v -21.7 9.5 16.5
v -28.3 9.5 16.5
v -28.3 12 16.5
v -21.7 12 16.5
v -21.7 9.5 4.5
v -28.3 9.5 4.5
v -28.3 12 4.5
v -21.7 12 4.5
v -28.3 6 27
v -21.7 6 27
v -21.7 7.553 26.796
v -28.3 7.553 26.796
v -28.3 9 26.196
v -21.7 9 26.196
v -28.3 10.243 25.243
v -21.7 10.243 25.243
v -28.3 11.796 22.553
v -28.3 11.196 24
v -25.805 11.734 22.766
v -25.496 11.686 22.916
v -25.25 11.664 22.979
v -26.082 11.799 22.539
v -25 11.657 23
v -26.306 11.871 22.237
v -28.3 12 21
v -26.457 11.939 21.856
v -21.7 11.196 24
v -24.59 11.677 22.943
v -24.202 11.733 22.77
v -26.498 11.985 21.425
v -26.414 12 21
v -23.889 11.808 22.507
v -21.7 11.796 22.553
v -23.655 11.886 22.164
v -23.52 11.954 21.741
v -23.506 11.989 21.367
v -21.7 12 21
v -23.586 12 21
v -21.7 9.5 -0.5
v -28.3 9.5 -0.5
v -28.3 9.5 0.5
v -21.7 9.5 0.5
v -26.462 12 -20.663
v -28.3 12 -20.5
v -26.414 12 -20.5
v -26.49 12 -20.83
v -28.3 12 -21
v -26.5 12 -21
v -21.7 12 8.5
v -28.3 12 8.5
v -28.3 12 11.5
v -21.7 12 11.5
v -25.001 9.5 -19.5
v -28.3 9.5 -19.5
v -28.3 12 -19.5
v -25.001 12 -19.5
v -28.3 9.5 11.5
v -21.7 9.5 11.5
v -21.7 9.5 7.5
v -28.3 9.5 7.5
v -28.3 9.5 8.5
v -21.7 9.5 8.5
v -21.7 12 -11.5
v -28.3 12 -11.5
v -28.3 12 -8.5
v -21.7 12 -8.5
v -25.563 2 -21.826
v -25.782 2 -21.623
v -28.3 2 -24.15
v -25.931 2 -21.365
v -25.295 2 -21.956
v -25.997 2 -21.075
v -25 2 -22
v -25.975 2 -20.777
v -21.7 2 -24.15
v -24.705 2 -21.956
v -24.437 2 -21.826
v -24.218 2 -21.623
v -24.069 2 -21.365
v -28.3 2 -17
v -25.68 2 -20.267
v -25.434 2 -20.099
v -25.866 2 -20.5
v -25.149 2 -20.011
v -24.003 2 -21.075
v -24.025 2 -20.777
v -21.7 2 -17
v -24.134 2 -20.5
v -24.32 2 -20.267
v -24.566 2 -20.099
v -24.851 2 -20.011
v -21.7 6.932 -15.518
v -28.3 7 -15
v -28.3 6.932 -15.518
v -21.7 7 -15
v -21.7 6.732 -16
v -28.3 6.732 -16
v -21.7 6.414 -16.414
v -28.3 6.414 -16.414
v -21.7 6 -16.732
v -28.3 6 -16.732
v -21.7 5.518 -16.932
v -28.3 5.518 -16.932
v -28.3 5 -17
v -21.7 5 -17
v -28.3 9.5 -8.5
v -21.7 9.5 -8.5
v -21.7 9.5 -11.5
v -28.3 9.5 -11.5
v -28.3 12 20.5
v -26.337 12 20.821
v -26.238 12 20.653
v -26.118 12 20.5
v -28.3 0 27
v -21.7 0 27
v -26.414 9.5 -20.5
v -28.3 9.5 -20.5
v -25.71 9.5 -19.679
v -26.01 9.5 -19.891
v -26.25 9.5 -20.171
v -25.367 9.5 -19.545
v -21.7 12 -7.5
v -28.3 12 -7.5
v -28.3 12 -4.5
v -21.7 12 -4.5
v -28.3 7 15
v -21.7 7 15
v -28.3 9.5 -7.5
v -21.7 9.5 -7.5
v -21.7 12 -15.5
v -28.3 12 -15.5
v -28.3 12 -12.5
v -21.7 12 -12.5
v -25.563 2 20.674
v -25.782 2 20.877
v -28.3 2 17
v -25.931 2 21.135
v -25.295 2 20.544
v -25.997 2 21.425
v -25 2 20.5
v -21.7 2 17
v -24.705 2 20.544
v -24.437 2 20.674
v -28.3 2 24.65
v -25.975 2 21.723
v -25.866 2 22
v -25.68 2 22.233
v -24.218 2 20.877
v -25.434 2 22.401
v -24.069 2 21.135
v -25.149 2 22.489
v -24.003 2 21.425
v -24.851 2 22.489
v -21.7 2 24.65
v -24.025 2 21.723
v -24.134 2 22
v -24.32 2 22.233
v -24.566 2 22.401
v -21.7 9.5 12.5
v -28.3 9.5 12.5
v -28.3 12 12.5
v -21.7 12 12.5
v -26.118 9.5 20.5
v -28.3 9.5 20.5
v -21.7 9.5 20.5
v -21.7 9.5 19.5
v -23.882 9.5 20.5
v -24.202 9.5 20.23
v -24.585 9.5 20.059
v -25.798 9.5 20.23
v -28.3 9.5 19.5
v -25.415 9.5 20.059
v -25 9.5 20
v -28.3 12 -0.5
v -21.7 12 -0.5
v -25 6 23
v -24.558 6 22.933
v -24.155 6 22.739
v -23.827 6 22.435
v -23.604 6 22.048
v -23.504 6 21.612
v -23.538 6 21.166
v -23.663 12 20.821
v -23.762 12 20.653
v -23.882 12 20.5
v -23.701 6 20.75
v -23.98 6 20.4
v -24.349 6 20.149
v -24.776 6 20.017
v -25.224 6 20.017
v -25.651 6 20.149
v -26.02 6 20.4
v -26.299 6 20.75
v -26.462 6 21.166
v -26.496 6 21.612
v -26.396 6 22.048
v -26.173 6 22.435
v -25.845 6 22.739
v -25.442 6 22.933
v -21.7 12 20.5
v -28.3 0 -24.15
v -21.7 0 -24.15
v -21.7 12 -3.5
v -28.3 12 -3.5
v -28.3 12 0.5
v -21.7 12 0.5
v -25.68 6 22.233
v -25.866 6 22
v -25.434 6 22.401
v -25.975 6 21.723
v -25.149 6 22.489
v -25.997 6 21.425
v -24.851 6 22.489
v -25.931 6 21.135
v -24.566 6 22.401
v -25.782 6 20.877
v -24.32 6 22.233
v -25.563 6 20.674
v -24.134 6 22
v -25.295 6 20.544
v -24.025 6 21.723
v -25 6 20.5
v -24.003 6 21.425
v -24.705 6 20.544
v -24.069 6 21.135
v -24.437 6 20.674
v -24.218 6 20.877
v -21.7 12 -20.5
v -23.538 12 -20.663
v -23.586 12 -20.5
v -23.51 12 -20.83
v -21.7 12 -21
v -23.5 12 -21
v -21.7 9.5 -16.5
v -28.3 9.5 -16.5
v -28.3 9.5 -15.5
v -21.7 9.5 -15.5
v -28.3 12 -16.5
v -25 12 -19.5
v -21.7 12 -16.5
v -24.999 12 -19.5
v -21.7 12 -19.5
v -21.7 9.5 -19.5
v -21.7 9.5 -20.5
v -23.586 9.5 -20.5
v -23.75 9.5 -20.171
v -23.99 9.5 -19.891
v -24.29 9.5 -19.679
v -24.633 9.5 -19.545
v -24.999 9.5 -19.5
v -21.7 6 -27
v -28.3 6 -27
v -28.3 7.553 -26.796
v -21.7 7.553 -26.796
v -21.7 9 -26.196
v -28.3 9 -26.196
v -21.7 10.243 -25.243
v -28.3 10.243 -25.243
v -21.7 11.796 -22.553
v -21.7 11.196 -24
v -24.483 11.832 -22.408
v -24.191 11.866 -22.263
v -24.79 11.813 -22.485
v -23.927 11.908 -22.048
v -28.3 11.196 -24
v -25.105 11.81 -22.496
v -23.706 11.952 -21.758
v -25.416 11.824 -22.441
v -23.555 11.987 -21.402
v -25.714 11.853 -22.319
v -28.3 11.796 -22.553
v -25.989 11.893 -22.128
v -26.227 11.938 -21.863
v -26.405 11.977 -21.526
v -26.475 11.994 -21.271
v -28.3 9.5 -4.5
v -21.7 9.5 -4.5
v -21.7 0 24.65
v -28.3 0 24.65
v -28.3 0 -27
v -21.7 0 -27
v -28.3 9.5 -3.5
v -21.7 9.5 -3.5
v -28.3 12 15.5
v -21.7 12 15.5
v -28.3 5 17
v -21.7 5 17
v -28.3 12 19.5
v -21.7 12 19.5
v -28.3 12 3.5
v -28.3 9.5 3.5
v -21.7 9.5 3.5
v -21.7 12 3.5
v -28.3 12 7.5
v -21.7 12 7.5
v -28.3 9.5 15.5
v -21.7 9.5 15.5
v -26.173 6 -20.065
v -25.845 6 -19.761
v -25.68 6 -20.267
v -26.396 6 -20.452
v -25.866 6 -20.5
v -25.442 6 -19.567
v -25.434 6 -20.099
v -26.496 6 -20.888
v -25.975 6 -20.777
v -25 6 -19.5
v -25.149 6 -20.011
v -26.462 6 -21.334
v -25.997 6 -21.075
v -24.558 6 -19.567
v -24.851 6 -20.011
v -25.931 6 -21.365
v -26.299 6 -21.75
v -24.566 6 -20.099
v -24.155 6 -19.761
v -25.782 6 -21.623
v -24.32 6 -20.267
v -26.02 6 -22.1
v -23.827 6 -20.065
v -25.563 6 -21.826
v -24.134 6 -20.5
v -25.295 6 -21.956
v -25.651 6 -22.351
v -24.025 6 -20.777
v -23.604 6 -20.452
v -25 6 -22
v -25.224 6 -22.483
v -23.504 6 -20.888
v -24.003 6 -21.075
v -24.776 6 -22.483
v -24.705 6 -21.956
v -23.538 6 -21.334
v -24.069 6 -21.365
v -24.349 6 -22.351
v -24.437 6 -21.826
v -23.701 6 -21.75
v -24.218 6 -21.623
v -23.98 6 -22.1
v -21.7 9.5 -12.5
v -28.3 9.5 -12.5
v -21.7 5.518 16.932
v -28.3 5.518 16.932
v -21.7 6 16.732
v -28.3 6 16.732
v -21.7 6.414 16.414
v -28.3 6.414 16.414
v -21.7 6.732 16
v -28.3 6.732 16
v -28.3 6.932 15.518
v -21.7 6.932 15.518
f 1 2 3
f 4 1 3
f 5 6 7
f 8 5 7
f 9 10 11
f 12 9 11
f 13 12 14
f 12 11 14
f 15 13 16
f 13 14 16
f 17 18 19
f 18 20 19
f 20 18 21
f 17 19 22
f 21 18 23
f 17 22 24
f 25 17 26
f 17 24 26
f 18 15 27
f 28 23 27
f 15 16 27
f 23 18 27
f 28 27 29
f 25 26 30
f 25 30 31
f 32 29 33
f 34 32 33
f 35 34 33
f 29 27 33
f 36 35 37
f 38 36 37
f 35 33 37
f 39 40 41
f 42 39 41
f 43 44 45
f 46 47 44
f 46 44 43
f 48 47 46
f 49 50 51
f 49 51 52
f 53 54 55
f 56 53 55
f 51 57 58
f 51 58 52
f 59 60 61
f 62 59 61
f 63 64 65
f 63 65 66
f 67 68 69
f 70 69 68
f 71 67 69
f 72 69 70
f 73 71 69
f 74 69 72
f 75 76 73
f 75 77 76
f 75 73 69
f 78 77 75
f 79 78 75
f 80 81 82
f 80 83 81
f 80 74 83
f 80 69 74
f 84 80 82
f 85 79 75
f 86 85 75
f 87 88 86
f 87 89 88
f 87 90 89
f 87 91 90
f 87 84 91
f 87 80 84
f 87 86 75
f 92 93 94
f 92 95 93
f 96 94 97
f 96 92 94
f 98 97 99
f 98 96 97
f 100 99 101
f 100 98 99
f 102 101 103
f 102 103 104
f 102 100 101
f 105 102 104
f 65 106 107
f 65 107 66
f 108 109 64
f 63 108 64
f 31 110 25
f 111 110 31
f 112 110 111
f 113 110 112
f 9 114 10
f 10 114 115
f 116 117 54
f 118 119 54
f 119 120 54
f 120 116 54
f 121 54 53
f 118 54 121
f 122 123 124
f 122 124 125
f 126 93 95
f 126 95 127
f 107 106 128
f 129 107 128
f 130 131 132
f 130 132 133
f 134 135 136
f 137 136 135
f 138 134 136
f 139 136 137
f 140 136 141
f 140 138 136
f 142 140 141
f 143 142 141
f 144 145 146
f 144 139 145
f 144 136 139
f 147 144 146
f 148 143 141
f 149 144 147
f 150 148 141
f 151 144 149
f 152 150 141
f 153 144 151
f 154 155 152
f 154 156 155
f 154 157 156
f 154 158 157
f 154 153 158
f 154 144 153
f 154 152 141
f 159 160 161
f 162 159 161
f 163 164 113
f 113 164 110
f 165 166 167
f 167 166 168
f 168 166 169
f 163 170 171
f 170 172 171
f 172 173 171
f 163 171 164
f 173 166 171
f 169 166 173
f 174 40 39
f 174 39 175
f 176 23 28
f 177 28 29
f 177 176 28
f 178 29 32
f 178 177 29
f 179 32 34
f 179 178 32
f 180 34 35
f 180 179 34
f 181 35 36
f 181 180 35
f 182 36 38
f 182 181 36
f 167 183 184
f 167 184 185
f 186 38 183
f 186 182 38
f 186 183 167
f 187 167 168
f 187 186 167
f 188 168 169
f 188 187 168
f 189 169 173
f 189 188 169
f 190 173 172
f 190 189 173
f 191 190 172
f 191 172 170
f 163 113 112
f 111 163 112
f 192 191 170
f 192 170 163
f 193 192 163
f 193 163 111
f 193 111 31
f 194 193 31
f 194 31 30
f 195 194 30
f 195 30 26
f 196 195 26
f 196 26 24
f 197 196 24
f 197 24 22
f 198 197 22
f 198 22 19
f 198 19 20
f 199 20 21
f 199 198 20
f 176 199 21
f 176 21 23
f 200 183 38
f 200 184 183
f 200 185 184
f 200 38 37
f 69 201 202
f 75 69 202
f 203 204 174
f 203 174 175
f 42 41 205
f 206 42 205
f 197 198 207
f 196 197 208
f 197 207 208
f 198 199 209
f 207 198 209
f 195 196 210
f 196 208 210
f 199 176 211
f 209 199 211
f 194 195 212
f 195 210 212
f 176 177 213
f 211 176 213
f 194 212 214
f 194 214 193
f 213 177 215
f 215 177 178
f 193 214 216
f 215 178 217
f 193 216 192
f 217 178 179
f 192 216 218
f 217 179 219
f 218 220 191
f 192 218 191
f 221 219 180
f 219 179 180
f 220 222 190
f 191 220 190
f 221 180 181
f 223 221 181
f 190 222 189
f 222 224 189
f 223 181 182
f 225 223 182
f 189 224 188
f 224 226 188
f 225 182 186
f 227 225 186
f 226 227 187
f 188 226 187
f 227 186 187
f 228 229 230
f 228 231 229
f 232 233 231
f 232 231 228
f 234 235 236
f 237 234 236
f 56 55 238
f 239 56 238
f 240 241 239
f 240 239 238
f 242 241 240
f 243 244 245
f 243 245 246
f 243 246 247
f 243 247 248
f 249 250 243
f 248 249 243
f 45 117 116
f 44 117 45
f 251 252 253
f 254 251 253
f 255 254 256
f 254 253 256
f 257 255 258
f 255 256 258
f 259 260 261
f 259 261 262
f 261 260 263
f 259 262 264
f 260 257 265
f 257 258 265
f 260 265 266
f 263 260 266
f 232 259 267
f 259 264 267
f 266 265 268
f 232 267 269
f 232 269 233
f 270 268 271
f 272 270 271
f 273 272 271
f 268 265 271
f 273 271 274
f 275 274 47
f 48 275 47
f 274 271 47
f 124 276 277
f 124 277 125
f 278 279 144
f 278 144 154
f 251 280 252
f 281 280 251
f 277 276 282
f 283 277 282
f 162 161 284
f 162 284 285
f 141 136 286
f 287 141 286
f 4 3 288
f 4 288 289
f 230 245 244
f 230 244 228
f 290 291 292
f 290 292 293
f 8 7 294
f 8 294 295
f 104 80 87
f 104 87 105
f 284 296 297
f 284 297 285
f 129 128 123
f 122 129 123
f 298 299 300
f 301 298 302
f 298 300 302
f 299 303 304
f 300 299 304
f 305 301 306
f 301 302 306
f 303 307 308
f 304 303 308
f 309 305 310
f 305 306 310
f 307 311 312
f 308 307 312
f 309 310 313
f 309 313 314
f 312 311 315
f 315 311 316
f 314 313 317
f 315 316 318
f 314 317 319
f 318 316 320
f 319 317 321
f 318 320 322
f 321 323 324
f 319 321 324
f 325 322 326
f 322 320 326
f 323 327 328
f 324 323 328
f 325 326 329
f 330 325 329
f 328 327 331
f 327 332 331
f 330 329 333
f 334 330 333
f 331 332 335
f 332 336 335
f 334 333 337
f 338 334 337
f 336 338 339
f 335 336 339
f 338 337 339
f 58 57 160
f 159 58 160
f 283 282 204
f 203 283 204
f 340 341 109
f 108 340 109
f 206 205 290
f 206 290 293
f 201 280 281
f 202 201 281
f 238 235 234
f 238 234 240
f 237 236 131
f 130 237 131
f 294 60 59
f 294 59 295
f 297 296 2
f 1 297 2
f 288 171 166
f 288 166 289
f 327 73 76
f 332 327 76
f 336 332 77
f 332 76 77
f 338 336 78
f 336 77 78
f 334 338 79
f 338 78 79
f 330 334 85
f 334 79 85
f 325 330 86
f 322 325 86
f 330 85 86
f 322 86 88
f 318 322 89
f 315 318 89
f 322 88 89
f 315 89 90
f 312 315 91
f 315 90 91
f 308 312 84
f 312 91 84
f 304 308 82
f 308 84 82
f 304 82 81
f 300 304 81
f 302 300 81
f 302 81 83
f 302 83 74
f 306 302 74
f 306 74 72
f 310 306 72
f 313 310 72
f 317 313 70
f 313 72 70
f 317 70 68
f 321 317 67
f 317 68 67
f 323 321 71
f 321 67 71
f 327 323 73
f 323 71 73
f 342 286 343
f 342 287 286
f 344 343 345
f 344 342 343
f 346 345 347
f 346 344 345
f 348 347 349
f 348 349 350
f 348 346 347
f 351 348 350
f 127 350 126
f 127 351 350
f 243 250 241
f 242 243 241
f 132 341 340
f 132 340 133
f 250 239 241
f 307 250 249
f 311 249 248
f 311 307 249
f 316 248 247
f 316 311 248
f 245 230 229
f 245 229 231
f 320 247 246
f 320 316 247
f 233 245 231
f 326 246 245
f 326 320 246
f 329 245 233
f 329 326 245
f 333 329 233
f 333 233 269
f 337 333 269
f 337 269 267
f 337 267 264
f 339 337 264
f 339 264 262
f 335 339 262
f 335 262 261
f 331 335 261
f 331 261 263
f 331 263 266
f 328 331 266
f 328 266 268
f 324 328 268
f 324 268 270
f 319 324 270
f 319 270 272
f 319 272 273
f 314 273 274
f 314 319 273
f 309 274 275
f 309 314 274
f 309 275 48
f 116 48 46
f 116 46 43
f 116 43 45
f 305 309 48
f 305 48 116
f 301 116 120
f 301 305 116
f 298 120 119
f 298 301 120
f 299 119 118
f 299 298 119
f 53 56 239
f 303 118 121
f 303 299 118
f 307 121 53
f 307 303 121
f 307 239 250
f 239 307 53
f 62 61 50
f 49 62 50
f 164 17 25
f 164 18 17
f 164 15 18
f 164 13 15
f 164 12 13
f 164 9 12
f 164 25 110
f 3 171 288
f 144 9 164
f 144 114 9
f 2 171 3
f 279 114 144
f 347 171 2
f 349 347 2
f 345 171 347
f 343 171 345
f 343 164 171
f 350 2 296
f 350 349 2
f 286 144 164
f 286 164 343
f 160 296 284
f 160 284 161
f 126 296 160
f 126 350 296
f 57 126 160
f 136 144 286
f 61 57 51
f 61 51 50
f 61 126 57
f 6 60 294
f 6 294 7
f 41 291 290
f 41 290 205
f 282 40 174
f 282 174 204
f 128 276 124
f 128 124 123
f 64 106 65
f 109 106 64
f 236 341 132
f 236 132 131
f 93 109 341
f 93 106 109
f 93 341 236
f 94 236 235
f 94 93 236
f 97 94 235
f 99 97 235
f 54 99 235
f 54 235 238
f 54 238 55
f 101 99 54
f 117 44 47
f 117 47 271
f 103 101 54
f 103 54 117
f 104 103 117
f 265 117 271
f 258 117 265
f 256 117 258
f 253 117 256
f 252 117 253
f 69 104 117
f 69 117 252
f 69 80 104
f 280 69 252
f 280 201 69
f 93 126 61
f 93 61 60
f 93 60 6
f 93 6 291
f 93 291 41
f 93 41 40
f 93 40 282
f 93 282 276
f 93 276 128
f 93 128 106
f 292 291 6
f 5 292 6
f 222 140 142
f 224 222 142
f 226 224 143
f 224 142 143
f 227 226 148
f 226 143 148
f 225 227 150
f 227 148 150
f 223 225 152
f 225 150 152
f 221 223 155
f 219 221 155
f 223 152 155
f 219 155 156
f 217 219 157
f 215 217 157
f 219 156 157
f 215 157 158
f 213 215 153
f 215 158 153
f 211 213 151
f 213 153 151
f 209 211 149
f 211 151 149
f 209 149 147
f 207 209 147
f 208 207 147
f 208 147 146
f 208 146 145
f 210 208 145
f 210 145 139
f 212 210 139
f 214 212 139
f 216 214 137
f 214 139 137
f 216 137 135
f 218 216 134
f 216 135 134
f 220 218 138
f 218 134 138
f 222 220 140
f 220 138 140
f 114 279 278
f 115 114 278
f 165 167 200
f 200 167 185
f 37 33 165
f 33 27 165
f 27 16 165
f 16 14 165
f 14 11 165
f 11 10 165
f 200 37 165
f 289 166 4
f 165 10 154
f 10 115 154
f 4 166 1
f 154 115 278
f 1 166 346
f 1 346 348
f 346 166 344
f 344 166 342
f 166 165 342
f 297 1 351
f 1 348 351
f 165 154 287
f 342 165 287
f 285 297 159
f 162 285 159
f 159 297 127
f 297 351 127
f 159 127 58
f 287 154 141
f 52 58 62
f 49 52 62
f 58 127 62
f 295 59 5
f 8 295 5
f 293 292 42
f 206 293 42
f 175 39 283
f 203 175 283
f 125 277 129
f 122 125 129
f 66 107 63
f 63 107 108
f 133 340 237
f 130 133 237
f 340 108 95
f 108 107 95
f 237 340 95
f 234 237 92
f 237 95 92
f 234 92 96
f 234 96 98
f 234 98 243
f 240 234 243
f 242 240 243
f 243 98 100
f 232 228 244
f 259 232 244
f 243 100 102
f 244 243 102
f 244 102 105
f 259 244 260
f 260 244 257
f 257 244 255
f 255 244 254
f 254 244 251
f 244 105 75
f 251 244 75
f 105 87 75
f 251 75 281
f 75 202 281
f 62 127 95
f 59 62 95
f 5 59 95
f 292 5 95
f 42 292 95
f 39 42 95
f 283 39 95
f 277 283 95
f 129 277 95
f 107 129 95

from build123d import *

# Parameters (mm, degrees)
SKETCH_1_W          = 6.6
SKETCH_1_H          = 54
SKETCH_1_R          = 1.49999954
EXTRUDE_1_DEPTH     = 12
FILLET_1_R          = 6
SKETCH_2_W          = 34
SKETCH_2_H          = 14
CUT_EXTRUDE_1_DEPTH = 20
FILLET_2_R          = 2
SKETCH_3_W          = 1
SKETCH_3_H          = 2.5
CUT_EXTRUDE_2_DEPTH = 31.274742098
SKETCH_4_W          = 14.557801868
SKETCH_4_H          = 48.8
CUT_EXTRUDE_3_DEPTH = 2
SKETCH_6_R          = 1.5
SKETCH_6_R_2        = 1
SKETCH_6_R_3        = 1.49999954
EXTRUDE_2_DEPTH     = 4


with BuildPart() as part:
    # 草图1 → 凸台-拉伸1 (new body)
    with BuildSketch(Plane(origin=(0, 0, 0), x_dir=(1, 0, 0), z_dir=(0, 1, 0))):
        with Locations((-25, 0)):
            Rectangle(SKETCH_1_W, SKETCH_1_H)
        with Locations(Location((-25, -21.49999992, 0), (0, 0, 270))):
            Circle(SKETCH_1_R, mode=Mode.SUBTRACT)
        with Locations(Location((-25, 20.9999989, 0), (0, 0, 270))):
            Circle(SKETCH_1_R, mode=Mode.SUBTRACT)
    extrude(amount=EXTRUDE_1_DEPTH)

    # 圆角1
    # the kernel refuses this fillet: 6 mm, written as the material it takes off along each edge
    with BuildSketch(Plane(origin=(-6.7, 12, 27), x_dir=(0, -1, 0), z_dir=(-1, 0, 0)), Plane(origin=(-43.3, 12, -27), x_dir=(0, -1, 0), z_dir=(1, 0, 0))) as fillet_1_piece_1:
        with BuildLine():
            CenterArc((FILLET_1_R, -FILLET_1_R), FILLET_1_R, 90, 90)
            Line((0, -FILLET_1_R), (0, 0))
            Line((0, 0), (FILLET_1_R, 0))
        make_face()
    extrude(amount=36.6, mode=Mode.SUBTRACT)

    # 草图2 → 切除-拉伸1 (cut)
    with BuildSketch(Plane.ZY.offset(28.3)):
        Rectangle(SKETCH_2_W, SKETCH_2_H)
    extrude(amount=-CUT_EXTRUDE_1_DEPTH, mode=Mode.SUBTRACT)

    # 圆角2
    fillet_2_edges = [part.edges().sort_by_distance(p)[0] for p in [
        (-25, 7, 17),
        (-25, 7, -17),
    ]]
    fillet(fillet_2_edges, radius=FILLET_2_R)

    # 草图3 → 切除-拉伸2 (cut, through all)
    with BuildSketch(Plane.ZY.offset(28.3)):
        with Locations((0, 10.75)):
            Rectangle(SKETCH_3_W, SKETCH_3_H)
        with Locations((4, 10.75)):
            Rectangle(SKETCH_3_W, SKETCH_3_H)
        with Locations((8, 10.75)):
            Rectangle(SKETCH_3_W, SKETCH_3_H)
        with Locations((12, 10.75)):
            Rectangle(SKETCH_3_W, SKETCH_3_H)
        with Locations((16, 10.75)):
            Rectangle(SKETCH_3_W, SKETCH_3_H)
        with Locations((20, 10.75)):
            Rectangle(SKETCH_3_W, SKETCH_3_H)
        with Locations((-4, 10.75)):
            Rectangle(SKETCH_3_W, SKETCH_3_H)
        with Locations((-8, 10.75)):
            Rectangle(SKETCH_3_W, SKETCH_3_H)
        with Locations((-12, 10.75)):
            Rectangle(SKETCH_3_W, SKETCH_3_H)
        with Locations((-16, 10.75)):
            Rectangle(SKETCH_3_W, SKETCH_3_H)
        with Locations((-20, 10.75)):
            Rectangle(SKETCH_3_W, SKETCH_3_H)
    extrude(amount=-CUT_EXTRUDE_2_DEPTH, mode=Mode.SUBTRACT)

    # 草图4 → 切除-拉伸3 (cut)
    with BuildSketch(Plane.XZ):
        with Locations((-25, 0.25000051)):
            Rectangle(SKETCH_4_W, SKETCH_4_H)
    extrude(amount=-CUT_EXTRUDE_3_DEPTH, mode=Mode.SUBTRACT)

    # 草图6 → 凸台-拉伸2 (add)
    # profile 1 of 2: a face of its own
    with BuildSketch(Plane.XZ.offset(-2)):
        with Locations(Location((-25, 21.49999992, 0), (0, 0, 270))):
            Circle(SKETCH_6_R)
        with Locations(Location((-25, 21.49999992, 0), (0, 0, 270))):
            Circle(SKETCH_6_R_2, mode=Mode.SUBTRACT)
    # profile 2 of 2: a face of its own
    with BuildSketch(Plane.XZ.offset(-2)):
        with Locations(Location((-25, -20.9999989, 0), (0, 0, 270))):
            Circle(SKETCH_6_R_3)
        with Locations(Location((-25, -20.9999989, 0), (0, 0, 270))):
            Circle(SKETCH_6_R_2, mode=Mode.SUBTRACT)
    extrude(amount=-EXTRUDE_2_DEPTH)


solid = part.part
